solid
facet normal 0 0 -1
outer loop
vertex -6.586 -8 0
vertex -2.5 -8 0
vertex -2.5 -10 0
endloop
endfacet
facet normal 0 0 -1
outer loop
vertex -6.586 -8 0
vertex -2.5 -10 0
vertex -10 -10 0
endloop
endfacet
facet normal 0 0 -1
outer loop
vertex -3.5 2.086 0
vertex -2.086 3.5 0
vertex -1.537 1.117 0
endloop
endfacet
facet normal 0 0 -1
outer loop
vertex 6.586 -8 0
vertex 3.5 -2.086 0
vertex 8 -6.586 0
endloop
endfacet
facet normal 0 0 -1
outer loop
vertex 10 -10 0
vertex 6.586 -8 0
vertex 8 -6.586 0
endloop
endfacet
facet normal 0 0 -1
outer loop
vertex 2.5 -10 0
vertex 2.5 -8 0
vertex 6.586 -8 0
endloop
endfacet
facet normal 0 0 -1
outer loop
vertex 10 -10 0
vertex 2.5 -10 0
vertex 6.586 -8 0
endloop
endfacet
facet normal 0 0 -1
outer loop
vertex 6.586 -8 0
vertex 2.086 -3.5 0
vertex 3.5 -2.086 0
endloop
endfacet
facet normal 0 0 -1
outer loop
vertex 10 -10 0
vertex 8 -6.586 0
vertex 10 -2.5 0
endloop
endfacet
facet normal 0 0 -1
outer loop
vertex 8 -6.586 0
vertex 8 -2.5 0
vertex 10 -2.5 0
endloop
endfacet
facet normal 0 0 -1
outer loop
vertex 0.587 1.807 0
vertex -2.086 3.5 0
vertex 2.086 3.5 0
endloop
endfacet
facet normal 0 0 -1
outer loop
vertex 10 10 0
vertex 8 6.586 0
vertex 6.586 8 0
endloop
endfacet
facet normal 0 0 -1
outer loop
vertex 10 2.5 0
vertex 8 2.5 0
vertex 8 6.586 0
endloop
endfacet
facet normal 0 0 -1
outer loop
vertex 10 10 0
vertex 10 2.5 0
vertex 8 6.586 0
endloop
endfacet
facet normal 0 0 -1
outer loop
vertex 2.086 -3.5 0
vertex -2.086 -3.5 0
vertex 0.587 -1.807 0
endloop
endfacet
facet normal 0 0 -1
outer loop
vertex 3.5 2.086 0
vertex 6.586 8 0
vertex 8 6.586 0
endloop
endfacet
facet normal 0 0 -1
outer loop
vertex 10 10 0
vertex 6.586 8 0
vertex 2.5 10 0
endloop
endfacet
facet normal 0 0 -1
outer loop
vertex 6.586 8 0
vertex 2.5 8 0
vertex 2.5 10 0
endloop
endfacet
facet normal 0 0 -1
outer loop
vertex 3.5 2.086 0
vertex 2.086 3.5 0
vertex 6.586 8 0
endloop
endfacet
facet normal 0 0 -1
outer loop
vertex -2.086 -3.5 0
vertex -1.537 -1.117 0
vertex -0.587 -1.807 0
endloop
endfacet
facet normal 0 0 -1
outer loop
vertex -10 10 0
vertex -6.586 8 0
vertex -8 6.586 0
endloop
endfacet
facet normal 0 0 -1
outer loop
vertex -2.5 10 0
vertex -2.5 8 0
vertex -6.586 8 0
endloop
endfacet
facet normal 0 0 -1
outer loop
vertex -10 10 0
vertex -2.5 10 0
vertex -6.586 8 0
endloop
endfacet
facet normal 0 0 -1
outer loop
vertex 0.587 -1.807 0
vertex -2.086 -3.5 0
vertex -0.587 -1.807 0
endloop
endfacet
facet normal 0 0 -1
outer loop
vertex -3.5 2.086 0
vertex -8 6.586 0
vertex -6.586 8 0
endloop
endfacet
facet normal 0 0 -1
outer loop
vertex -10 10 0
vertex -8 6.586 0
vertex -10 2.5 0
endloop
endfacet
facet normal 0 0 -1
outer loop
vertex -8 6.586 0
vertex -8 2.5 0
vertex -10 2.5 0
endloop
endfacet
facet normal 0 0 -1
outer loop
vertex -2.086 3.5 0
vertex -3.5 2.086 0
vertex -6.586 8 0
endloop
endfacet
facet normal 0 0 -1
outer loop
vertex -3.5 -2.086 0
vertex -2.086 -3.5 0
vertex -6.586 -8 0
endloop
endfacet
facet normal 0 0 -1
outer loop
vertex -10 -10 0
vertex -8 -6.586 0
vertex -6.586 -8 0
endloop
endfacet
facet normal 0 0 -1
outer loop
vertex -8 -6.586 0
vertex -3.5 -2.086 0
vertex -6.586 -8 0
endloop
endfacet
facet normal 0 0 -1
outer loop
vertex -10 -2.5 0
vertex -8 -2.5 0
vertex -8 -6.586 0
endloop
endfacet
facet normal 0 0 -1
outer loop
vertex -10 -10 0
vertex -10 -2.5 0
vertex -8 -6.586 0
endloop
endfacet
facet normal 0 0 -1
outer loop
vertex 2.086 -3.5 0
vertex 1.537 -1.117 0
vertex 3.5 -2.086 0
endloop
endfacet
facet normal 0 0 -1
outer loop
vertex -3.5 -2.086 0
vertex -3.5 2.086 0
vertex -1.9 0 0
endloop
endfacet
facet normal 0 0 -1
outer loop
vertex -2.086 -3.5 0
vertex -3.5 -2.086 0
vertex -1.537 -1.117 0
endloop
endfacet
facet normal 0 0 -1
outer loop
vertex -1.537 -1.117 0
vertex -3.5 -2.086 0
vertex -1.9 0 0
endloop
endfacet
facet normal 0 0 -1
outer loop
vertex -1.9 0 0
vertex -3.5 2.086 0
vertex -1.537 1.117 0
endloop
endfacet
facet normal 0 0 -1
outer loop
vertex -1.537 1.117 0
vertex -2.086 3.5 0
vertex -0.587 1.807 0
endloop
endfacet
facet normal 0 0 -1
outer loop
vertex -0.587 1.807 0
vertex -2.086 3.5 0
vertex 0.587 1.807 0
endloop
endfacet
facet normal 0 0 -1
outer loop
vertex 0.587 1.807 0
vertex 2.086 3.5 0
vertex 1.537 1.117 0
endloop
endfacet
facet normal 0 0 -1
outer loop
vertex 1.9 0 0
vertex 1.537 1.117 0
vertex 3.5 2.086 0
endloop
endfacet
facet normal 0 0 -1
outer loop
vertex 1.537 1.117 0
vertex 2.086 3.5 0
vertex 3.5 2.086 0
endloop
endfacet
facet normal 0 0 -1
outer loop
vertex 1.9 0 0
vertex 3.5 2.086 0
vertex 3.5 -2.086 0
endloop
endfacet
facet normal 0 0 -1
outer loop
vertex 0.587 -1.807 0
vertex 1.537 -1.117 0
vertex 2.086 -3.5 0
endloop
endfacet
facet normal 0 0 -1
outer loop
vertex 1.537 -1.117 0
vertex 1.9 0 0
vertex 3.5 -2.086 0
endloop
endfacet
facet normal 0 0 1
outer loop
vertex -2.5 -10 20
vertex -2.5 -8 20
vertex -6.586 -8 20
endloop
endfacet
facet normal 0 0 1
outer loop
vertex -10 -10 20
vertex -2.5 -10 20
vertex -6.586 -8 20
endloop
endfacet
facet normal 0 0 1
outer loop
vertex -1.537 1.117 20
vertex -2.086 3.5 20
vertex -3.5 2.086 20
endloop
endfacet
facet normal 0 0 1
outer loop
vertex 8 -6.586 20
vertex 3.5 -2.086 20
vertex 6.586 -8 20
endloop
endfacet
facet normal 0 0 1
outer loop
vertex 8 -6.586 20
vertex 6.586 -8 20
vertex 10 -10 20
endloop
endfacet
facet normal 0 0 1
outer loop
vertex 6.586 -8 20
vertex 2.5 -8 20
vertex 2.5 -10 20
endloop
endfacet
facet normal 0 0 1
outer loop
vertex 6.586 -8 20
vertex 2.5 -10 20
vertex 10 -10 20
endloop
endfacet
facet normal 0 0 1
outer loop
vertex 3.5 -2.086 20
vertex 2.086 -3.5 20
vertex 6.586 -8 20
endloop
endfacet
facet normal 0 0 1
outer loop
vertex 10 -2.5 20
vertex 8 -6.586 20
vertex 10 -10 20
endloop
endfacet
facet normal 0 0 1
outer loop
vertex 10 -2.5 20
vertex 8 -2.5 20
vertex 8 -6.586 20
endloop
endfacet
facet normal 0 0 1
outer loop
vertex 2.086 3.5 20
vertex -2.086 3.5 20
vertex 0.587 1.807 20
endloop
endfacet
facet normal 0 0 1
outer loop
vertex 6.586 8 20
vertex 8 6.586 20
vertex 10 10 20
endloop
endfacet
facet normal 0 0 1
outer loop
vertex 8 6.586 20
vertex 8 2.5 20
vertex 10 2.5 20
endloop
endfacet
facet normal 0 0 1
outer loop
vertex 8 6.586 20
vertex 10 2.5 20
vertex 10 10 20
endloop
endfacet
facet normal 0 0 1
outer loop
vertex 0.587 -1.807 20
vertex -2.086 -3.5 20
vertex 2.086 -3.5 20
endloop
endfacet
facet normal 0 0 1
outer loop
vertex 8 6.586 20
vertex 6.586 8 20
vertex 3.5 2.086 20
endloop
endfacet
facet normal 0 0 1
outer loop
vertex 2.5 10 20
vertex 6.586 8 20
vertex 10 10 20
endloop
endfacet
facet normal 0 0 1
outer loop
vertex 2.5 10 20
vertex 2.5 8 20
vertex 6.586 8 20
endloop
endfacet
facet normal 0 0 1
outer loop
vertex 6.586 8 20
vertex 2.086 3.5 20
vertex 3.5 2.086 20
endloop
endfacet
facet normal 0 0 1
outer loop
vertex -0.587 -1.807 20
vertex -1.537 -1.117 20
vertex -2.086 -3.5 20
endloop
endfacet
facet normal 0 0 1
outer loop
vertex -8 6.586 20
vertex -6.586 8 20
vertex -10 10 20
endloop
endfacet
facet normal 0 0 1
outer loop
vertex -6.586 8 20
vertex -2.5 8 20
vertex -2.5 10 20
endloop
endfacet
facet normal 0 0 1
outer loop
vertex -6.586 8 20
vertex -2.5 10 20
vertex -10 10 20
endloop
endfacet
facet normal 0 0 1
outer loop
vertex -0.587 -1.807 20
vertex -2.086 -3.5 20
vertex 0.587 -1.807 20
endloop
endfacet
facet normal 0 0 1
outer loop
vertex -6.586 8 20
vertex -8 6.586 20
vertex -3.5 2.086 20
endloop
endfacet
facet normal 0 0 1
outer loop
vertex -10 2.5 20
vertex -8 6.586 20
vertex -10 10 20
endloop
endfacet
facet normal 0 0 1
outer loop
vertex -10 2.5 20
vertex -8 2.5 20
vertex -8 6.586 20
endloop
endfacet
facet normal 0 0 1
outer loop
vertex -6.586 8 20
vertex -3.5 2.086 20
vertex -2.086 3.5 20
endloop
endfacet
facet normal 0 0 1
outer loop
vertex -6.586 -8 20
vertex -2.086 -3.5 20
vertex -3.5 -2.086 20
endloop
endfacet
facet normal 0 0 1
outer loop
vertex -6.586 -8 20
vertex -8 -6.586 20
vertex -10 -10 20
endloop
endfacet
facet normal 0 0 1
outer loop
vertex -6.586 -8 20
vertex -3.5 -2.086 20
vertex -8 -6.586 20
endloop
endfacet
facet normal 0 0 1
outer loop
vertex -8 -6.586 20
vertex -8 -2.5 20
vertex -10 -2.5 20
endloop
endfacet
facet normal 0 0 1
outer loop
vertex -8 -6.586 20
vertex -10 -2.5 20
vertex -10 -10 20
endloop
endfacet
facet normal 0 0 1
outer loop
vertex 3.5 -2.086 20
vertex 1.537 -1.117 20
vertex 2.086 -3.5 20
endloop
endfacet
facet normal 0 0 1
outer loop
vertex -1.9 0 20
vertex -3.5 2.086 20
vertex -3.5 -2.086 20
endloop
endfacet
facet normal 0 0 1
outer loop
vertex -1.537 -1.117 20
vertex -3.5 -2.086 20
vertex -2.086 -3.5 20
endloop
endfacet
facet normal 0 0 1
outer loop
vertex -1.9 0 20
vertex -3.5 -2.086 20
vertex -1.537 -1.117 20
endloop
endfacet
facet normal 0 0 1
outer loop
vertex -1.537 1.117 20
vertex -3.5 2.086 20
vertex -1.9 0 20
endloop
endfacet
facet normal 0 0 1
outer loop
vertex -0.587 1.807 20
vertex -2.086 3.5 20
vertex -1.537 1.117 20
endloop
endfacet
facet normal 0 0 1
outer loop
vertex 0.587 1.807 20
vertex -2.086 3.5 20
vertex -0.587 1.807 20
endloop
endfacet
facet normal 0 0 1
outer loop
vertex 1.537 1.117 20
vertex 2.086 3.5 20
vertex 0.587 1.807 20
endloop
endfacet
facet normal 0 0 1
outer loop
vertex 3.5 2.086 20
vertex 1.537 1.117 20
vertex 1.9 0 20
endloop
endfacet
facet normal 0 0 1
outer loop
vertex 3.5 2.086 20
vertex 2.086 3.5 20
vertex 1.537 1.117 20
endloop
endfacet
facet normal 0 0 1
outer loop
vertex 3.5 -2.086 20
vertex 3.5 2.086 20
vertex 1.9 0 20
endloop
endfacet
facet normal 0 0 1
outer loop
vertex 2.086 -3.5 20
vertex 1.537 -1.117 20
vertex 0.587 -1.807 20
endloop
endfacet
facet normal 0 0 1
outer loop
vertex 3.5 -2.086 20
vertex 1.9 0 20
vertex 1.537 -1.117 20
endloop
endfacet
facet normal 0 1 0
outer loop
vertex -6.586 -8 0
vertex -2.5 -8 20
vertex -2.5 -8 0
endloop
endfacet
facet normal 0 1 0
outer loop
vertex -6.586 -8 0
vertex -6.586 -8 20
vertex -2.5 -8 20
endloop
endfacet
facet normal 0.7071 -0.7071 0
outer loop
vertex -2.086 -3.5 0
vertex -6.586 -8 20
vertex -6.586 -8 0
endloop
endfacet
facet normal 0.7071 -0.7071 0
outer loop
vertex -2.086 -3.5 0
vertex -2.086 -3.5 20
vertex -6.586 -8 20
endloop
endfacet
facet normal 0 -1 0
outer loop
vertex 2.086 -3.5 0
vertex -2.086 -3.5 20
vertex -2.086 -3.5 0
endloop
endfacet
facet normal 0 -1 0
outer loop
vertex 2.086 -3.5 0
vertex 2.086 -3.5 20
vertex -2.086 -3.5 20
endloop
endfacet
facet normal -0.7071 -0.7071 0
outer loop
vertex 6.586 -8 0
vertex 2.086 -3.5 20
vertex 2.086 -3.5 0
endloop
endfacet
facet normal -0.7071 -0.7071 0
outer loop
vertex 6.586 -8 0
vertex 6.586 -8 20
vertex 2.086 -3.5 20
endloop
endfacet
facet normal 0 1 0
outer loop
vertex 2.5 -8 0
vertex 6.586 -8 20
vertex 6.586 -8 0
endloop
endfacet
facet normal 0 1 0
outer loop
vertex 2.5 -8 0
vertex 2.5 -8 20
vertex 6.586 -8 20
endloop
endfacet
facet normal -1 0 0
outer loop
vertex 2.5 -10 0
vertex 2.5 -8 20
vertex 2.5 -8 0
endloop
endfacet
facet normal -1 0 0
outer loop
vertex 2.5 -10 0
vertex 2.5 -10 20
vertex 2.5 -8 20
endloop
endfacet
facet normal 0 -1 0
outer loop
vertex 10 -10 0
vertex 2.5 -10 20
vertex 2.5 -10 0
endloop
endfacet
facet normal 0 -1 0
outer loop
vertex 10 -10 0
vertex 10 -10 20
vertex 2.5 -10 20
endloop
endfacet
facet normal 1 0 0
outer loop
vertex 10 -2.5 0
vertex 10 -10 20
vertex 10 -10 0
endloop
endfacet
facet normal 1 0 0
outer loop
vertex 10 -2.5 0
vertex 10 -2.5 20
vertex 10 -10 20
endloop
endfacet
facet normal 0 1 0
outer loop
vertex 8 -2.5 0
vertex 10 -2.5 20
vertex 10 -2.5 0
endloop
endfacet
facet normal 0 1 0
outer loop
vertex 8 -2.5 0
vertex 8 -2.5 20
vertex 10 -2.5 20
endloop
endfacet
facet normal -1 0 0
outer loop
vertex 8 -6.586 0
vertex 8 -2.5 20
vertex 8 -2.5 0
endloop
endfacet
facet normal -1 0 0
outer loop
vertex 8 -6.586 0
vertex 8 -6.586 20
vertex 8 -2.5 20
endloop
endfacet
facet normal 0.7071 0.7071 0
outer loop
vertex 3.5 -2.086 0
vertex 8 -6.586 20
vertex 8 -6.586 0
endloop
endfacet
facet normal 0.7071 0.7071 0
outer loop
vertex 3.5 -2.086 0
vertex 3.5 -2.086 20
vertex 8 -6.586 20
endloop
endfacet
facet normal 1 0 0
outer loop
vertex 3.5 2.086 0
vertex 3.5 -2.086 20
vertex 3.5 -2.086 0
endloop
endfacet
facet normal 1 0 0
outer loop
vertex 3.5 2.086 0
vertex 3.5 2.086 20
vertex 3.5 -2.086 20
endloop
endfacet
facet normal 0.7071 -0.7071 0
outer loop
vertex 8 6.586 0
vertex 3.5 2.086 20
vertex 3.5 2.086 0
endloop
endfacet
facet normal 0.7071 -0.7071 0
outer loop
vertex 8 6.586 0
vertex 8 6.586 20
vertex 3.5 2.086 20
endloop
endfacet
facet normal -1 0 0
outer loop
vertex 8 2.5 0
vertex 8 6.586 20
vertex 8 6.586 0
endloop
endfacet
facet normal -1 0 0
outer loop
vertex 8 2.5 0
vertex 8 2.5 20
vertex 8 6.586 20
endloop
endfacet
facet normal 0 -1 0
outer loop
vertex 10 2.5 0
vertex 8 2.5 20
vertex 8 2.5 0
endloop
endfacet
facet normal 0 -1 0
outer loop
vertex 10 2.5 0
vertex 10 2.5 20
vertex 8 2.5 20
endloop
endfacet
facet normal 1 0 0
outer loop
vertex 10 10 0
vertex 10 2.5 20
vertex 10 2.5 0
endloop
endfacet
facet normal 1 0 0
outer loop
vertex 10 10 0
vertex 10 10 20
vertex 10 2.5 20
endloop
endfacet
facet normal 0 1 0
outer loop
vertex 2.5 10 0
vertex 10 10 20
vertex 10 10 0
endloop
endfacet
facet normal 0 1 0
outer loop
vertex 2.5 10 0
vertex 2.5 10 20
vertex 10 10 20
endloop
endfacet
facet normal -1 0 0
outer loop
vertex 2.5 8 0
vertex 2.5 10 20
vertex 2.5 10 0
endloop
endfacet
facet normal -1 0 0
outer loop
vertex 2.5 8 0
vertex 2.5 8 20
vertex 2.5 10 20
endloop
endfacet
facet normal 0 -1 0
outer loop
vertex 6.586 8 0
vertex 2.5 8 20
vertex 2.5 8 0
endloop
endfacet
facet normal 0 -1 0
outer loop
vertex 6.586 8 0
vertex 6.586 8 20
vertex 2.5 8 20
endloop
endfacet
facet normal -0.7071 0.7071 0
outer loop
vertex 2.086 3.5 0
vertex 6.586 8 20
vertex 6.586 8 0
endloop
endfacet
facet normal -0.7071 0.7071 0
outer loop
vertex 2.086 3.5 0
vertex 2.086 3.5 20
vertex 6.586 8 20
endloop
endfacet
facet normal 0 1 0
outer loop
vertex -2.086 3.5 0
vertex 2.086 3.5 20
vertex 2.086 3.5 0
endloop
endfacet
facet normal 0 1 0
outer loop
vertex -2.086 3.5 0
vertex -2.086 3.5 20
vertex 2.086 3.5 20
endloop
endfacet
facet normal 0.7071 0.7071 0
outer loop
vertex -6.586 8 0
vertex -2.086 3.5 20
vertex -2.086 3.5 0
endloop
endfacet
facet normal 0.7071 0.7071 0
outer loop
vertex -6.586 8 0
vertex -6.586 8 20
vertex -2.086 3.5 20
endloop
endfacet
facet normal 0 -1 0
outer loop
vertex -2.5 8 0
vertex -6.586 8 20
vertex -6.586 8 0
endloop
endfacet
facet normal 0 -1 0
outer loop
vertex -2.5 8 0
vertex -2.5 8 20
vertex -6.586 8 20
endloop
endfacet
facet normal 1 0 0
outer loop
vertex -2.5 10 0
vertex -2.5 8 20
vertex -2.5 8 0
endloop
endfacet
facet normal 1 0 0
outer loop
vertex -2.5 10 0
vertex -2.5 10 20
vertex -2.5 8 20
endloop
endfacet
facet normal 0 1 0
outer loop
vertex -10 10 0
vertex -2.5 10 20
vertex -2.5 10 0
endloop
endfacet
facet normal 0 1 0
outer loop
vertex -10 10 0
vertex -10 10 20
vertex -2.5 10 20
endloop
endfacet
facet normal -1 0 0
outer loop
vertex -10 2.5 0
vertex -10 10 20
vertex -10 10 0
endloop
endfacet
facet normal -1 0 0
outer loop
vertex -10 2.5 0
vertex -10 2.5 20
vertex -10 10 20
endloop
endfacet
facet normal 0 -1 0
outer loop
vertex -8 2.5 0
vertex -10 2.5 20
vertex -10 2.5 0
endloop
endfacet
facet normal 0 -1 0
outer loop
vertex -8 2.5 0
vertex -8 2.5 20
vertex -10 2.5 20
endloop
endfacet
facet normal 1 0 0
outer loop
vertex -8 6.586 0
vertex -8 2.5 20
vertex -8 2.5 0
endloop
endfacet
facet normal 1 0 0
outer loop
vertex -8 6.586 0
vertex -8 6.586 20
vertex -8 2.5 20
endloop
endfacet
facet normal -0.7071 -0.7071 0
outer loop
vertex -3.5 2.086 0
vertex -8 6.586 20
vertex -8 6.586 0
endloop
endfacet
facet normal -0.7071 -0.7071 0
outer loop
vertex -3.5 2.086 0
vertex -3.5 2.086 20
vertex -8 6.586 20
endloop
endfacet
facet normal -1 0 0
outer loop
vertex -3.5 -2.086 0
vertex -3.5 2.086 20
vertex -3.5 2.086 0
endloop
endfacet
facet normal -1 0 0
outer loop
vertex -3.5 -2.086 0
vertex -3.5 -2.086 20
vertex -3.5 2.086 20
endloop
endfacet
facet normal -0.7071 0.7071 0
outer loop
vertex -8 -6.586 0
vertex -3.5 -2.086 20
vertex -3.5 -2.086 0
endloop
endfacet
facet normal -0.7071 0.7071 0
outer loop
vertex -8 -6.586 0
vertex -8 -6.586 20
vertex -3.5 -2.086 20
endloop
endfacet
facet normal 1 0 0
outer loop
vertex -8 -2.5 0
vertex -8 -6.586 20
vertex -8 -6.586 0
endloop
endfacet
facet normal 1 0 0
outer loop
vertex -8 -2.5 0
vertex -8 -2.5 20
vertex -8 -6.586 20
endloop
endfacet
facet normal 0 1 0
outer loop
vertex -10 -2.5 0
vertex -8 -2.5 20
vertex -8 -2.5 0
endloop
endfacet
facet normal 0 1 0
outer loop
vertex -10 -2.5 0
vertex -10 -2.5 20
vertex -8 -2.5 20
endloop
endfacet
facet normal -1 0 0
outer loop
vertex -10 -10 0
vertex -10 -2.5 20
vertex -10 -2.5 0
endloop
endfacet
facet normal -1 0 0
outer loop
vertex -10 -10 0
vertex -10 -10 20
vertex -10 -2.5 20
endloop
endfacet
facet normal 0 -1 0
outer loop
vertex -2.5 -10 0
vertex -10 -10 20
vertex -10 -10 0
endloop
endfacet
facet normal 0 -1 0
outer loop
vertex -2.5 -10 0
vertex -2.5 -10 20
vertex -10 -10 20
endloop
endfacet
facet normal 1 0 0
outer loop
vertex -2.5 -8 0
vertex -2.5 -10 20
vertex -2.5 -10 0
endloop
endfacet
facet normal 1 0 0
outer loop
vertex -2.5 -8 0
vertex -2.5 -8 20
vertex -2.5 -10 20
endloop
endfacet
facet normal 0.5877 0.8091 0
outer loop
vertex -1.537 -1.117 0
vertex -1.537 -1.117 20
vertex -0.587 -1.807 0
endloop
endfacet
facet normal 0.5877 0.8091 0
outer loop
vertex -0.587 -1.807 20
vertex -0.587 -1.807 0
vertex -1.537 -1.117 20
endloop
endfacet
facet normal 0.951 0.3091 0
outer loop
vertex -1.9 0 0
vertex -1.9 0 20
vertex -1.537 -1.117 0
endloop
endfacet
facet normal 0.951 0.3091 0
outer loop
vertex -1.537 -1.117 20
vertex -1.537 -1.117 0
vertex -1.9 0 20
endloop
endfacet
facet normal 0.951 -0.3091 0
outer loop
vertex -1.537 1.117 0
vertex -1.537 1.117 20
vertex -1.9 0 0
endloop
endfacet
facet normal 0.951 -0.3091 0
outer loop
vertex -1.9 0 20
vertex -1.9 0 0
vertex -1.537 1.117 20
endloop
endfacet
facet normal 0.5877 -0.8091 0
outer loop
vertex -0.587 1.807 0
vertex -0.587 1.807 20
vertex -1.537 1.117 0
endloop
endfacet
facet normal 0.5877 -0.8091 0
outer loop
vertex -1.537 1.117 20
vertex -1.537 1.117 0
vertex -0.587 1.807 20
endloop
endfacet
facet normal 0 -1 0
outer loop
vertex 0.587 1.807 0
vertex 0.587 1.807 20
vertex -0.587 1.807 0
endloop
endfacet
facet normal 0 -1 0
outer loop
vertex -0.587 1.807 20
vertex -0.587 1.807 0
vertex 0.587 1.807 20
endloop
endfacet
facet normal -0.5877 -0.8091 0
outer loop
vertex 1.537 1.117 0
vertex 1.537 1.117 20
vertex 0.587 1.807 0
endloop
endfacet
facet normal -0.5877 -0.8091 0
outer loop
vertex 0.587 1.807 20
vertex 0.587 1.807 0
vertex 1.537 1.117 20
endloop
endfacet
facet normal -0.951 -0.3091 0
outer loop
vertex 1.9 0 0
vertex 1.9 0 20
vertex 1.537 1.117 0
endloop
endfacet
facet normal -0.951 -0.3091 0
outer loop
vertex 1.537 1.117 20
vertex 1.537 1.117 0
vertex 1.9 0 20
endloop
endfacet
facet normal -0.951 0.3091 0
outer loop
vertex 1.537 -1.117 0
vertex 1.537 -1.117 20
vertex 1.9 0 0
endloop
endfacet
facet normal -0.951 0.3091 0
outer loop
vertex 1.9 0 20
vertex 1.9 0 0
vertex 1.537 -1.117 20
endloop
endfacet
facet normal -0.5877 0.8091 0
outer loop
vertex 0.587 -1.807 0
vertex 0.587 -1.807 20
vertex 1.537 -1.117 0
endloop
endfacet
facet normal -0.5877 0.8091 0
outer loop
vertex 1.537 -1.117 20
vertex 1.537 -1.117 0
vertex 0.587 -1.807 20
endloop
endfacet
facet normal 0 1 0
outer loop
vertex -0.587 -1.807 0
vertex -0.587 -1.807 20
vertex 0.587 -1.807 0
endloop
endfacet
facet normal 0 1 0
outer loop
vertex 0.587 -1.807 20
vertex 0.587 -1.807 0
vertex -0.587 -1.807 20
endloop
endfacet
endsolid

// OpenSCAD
module profile2020( h=100 )
linear_extrude(h) {
    union() {
        // external corners
        difference() {
            square(20,center=true);
            square(16,center=true);
            for( angle=[0, 90, 180, 270] )
                rotate( [0,0,angle] )
                    translate( [10,0,0] )
                        square([8,5],center=true);
        }
        // middle part, with a hole
        difference() {
            square( 7, center=true );
            circle( d=3.8, center=true, $fn=10 );
        }
        // diagonal parts
        for( angle = [0,90,180,270] )
        rotate( [0,0,45+angle] )
            translate([7.5,0,0])
                square( [8,2], center=true );
    }
}

profile2020(20);
